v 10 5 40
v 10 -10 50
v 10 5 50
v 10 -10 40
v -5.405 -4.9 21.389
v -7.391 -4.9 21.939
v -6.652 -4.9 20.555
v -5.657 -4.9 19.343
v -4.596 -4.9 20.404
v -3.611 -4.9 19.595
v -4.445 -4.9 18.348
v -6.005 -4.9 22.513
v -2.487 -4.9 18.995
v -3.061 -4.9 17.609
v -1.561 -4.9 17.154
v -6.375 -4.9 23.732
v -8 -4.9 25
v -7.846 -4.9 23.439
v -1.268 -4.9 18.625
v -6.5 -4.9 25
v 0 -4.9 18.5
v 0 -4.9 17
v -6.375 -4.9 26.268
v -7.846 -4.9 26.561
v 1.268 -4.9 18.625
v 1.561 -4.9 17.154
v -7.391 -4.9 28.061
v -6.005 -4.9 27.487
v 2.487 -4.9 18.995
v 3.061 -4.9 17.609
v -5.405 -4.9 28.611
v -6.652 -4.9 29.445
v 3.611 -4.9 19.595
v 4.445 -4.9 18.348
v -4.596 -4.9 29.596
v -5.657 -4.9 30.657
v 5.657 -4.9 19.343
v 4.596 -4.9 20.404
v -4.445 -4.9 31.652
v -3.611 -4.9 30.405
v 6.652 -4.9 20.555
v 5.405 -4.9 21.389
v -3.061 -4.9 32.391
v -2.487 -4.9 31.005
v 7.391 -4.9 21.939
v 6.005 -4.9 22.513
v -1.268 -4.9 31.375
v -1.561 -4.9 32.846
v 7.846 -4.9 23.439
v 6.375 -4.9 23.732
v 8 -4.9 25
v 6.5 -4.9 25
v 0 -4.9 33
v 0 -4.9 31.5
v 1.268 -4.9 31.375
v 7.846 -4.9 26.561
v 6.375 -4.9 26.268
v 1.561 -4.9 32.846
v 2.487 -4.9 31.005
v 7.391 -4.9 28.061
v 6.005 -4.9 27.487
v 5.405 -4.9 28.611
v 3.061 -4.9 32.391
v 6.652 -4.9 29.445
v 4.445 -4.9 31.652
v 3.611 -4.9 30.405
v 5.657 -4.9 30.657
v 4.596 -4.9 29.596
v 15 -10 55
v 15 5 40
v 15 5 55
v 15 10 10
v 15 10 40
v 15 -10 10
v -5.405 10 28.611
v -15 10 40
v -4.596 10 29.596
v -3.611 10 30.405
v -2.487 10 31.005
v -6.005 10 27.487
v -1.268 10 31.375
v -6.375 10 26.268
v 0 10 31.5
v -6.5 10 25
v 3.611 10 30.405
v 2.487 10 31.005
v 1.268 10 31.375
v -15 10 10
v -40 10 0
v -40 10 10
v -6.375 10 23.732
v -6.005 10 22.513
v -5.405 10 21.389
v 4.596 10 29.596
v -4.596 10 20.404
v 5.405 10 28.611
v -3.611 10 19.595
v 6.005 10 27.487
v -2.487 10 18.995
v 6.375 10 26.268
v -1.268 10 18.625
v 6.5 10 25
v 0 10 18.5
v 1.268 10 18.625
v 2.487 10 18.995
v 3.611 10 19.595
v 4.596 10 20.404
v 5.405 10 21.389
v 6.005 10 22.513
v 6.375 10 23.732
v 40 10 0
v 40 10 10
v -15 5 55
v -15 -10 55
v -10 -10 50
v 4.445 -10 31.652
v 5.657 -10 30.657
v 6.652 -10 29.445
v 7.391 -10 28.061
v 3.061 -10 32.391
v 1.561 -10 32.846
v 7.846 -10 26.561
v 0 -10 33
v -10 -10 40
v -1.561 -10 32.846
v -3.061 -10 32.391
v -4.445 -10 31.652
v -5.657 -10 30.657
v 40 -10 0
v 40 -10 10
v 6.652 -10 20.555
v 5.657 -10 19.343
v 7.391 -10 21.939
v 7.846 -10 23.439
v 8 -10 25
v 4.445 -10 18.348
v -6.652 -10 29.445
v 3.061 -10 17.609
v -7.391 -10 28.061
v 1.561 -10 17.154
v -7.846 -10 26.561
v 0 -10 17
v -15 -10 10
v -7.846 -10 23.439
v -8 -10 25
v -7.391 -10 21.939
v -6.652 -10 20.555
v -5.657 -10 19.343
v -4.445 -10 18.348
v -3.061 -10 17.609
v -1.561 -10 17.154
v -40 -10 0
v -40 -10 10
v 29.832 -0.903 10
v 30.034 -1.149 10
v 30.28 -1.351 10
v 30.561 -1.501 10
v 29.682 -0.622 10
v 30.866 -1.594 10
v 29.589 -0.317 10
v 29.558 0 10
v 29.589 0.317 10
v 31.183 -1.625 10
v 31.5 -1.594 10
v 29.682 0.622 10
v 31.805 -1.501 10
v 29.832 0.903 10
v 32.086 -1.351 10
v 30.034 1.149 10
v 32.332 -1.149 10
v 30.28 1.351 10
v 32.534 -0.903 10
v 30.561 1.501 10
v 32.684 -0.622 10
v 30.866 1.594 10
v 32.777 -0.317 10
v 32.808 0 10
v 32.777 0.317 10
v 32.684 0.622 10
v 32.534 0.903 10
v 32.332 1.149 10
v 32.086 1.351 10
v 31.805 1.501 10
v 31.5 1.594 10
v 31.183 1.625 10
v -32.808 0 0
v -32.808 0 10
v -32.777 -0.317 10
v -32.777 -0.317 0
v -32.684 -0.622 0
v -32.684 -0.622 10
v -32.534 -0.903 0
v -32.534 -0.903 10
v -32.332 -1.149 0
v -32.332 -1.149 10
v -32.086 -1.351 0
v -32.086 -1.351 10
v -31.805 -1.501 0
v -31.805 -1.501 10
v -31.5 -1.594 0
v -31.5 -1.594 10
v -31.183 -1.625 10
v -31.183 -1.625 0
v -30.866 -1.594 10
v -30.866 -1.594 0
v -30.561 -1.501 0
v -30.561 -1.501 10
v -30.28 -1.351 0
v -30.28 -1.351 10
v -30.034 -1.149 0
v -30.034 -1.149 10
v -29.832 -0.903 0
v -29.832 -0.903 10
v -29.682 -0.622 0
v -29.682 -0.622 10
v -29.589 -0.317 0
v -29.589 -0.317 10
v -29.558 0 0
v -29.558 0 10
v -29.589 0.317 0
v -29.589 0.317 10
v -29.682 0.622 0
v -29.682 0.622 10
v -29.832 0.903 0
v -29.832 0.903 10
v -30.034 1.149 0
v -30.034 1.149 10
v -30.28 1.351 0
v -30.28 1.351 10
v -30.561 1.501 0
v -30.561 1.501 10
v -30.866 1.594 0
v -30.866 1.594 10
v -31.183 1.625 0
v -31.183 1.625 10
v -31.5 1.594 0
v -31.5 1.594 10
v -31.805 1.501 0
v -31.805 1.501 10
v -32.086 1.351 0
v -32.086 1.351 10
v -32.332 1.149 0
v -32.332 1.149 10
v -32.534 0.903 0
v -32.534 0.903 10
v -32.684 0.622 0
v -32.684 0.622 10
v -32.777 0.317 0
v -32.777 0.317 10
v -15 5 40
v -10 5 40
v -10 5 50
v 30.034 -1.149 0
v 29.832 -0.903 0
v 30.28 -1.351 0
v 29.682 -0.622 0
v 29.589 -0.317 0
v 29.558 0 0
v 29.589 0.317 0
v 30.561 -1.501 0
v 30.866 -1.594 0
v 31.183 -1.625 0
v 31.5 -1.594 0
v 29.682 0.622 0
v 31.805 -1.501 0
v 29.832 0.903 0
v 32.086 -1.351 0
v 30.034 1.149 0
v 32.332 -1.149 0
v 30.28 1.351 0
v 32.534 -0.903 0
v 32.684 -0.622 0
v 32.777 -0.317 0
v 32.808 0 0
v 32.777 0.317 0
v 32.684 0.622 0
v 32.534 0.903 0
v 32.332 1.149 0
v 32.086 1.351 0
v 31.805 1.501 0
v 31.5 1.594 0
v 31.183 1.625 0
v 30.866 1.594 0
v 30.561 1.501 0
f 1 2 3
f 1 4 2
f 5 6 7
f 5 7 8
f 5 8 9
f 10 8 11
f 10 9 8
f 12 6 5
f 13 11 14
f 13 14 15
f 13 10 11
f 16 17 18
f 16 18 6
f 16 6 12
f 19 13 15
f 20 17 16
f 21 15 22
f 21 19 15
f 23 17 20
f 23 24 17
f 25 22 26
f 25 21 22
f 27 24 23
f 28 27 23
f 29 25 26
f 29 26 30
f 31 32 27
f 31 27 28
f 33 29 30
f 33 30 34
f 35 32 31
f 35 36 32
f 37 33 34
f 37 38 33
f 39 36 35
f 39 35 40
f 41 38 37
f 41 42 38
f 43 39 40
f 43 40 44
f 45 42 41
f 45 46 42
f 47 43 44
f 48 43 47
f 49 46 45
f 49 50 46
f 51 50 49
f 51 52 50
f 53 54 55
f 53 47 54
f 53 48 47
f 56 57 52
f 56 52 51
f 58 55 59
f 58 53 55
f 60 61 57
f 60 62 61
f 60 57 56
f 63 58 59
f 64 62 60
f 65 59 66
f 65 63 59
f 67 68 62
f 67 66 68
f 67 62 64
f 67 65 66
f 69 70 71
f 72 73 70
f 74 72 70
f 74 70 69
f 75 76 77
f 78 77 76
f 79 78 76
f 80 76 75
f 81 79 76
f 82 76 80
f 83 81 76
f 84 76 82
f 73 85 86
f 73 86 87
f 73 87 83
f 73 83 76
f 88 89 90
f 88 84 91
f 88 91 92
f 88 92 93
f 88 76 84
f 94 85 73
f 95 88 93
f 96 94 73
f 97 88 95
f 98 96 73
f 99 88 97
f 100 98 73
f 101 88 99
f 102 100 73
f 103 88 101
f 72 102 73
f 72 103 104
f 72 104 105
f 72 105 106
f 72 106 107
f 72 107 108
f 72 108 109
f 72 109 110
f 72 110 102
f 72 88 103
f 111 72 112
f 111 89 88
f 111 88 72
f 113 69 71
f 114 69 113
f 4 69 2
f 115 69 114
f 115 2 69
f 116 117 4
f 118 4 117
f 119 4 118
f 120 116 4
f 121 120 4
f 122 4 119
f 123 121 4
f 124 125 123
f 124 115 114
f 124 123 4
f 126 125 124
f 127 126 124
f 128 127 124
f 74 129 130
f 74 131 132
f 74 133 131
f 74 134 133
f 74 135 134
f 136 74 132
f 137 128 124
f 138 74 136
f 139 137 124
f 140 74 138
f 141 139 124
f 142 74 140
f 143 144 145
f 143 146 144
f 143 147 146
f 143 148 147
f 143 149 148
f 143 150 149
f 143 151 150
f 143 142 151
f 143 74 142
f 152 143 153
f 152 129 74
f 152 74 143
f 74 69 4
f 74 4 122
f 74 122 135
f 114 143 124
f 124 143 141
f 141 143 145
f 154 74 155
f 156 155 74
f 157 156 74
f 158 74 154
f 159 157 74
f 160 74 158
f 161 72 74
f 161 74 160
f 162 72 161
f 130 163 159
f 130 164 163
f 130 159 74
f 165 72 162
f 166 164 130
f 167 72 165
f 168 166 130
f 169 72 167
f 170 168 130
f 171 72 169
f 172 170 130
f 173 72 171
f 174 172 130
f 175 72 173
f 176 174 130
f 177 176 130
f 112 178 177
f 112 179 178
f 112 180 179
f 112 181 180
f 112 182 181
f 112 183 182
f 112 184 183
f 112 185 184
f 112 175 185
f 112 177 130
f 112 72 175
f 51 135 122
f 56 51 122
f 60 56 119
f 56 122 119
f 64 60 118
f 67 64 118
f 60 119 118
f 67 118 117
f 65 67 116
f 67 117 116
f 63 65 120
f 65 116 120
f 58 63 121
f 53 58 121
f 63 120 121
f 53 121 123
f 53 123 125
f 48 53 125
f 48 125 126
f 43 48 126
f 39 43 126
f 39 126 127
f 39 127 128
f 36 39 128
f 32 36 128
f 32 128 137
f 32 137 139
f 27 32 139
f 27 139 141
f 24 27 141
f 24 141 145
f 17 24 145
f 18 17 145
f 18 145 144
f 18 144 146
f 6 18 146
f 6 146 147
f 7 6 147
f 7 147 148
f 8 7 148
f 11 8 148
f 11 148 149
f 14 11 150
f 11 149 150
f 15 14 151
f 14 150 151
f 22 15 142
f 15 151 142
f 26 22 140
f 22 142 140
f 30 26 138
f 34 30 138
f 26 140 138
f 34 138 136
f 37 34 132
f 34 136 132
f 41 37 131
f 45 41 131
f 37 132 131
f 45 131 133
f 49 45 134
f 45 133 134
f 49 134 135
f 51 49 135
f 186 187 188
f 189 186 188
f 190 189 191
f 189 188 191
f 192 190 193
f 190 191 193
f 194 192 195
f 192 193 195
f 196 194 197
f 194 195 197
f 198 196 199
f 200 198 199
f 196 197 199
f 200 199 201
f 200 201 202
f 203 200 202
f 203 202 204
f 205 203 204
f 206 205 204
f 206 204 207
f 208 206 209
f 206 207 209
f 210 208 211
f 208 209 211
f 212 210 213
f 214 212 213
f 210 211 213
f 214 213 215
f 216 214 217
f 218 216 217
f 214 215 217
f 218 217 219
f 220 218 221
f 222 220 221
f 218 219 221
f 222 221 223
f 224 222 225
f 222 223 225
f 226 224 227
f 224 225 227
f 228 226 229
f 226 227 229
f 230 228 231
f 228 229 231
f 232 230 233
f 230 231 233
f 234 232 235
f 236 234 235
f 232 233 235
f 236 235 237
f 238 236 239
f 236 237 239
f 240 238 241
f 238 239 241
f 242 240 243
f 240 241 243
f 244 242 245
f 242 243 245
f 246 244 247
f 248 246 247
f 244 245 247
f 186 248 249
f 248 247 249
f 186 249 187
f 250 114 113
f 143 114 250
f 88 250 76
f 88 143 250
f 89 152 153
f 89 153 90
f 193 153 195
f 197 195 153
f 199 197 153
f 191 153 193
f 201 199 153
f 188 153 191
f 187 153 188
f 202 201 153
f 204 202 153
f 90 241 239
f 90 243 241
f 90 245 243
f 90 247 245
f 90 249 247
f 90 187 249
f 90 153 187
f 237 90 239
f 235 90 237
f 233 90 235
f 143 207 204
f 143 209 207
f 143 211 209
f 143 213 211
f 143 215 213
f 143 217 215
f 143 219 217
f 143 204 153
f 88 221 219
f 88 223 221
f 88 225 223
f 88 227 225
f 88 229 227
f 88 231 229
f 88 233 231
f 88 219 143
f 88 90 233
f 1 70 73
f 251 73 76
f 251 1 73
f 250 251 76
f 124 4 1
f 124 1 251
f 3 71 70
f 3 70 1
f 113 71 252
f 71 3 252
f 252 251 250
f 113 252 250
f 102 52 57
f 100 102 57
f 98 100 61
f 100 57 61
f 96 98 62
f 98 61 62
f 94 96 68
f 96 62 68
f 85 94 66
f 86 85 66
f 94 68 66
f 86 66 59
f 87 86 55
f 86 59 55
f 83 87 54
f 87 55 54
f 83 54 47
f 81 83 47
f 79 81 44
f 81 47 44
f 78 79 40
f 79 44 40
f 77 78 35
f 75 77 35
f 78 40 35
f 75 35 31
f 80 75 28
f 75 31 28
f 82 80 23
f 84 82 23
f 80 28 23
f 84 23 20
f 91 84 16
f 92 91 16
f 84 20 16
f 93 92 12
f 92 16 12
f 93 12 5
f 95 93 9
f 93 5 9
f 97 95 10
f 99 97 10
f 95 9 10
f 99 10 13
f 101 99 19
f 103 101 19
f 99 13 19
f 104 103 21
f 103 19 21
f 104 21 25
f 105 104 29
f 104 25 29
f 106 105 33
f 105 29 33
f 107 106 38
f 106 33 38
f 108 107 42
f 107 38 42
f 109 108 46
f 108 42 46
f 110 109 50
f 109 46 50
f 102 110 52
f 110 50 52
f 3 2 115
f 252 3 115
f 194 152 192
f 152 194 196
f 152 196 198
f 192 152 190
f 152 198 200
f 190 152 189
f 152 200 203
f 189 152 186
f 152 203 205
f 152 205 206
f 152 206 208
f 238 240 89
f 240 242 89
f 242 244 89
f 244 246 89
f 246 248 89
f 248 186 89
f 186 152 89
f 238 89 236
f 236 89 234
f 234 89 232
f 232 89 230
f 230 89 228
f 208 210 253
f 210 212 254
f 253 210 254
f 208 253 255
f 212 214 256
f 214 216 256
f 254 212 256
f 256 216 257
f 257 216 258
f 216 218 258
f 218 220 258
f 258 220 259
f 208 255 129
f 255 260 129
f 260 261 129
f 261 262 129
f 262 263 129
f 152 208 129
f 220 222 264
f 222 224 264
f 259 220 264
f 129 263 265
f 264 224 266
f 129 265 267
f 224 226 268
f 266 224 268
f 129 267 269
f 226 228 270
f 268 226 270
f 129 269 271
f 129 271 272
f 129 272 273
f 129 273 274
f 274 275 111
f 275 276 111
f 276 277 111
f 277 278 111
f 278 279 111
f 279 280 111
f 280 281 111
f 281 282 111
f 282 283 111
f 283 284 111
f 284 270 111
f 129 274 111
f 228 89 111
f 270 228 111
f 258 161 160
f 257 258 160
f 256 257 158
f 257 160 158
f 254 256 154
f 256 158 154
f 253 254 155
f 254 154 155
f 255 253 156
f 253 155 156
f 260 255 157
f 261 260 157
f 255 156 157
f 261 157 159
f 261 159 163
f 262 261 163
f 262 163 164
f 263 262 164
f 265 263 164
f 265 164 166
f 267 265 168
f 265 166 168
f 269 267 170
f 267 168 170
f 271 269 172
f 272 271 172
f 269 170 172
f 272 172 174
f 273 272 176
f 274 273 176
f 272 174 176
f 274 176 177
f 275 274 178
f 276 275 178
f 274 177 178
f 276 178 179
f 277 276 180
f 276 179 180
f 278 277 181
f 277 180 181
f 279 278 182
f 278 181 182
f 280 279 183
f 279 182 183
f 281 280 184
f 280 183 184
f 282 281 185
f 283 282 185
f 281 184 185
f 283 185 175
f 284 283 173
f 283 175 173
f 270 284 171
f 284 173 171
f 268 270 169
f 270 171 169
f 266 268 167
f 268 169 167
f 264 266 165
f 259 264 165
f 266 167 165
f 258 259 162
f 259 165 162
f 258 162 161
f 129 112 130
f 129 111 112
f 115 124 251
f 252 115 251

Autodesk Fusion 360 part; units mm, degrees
sketch "Esquisse1" plane through (0, 0, 0) normal (0, 0, 1) x (1, 0, 0)
  line L0 (-40, 10) -> (40, 10)
  line L1 (40, 10) -> (40, -10)
  line L2 (40, -10) -> (-40, -10)
  line L3 (-40, -10) -> (-40, 10)
extrude "Extrusion1" add sketch "Esquisse1" along normal blind 10
sketch "Esquisse2" plane through (0, 0, 10) normal (0, 0, 1) x (-1, 0, 0)
  line L0 (40, 10) -> (-40, 10)
  line L1 (-40, 10) -> (-40, -10)
  line L2 (-40, -10) -> (40, -10)
  line L3 (40, -10) -> (40, 10)
  line L4 (15, -10) -> (-15, -10)
  line L5 (-15, -10) -> (-15, 10)
  line L6 (-15, 10) -> (15, 10)
  line L7 (15, 10) -> (15, -10)
  circle A0 centre (-31.183, 0) radius 1.625
  circle A1 centre (31.183, 0) radius 1.625
  dimension "d7" = 3.25
  dimension "d8" = 3.25
extrude "Extrusion2" cut sketch "Esquisse2" against normal blind 10 contours A1
extrude "Extrusion3" cut sketch "Esquisse2" against normal blind 10 contours A0
extrude "Extrusion4" add sketch "Esquisse2" along normal blind 30 contours L0 L2 L4 L5 L6 L7
sketch "Esquisse3" plane through (0, -10, 0) normal (0, -1, 0) x (1, 0, 0)
  line L0 (-40, 0) -> (40, 0)
  line L1 (40, 0) -> (40, 10)
  line L2 (40, 10) -> (15, 10)
  line L3 (15, 10) -> (15, 40)
  line L4 (15, 40) -> (-15, 40)
  line L5 (-15, 40) -> (-15, 10)
  line L6 (-15, 10) -> (-40, 10)
  line L7 (-40, 10) -> (-40, 0)
  circle A0 centre (0, 25) radius 6.5
  circle A1 centre (0, 25) radius 8
  dimension "d15" = 13
  dimension "d16" = 16
extrude "Extrusion5" cut sketch "Esquisse3" against normal blind 20 contours A0
extrude "Extrusion6" cut sketch "Esquisse3" against normal blind 5.1 contours A1
sketch "Esquisse4" plane through (0, 0, 40) normal (0, 0, 1) x (-1, 0, 0)
  line L0 (15, 10) -> (-15, 10)
  line L1 (-15, 10) -> (-15, -10)
  line L2 (-15, -10) -> (15, -10)
  line L3 (15, -10) -> (15, 10)
  line L4 (15, 10) -> (10, 10)
  line L5 (10, 10) -> (10, -5)
  line L6 (10, -5) -> (15, -5)
  line L7 (15, -5) -> (15, 10)
  line L8 (-15, 10) -> (-10, 10)
  line L9 (-10, 10) -> (-10, -5)
  line L10 (-10, -5) -> (-15, -5)
  line L11 (-15, -5) -> (-15, 10)
extrude "Extrusion7" add sketch "Esquisse4" along normal blind 10 contours L0 L3 L4 L5 L6 L7 | L0 L1 L8 L9 L10 L11
sketch "Esquisse5" plane through (0, 0, 50) normal (0, 0, 1) x (-1, 0, 0)
  line L0 (15, -5) -> (15, 10)
  line L1 (15, 10) -> (10, 10)
  line L2 (10, 10) -> (10, -5)
  line L3 (10, -5) -> (15, -5)
  line L4 (15, -5) -> (-15, -5)
  line L5 (-15, -5) -> (-15, 10)
  line L6 (-15, 10) -> (15, 10)
  line L7 (15, 10) -> (15, -5)
extrude "Extrusion8" add sketch "Esquisse5" along normal blind 5
